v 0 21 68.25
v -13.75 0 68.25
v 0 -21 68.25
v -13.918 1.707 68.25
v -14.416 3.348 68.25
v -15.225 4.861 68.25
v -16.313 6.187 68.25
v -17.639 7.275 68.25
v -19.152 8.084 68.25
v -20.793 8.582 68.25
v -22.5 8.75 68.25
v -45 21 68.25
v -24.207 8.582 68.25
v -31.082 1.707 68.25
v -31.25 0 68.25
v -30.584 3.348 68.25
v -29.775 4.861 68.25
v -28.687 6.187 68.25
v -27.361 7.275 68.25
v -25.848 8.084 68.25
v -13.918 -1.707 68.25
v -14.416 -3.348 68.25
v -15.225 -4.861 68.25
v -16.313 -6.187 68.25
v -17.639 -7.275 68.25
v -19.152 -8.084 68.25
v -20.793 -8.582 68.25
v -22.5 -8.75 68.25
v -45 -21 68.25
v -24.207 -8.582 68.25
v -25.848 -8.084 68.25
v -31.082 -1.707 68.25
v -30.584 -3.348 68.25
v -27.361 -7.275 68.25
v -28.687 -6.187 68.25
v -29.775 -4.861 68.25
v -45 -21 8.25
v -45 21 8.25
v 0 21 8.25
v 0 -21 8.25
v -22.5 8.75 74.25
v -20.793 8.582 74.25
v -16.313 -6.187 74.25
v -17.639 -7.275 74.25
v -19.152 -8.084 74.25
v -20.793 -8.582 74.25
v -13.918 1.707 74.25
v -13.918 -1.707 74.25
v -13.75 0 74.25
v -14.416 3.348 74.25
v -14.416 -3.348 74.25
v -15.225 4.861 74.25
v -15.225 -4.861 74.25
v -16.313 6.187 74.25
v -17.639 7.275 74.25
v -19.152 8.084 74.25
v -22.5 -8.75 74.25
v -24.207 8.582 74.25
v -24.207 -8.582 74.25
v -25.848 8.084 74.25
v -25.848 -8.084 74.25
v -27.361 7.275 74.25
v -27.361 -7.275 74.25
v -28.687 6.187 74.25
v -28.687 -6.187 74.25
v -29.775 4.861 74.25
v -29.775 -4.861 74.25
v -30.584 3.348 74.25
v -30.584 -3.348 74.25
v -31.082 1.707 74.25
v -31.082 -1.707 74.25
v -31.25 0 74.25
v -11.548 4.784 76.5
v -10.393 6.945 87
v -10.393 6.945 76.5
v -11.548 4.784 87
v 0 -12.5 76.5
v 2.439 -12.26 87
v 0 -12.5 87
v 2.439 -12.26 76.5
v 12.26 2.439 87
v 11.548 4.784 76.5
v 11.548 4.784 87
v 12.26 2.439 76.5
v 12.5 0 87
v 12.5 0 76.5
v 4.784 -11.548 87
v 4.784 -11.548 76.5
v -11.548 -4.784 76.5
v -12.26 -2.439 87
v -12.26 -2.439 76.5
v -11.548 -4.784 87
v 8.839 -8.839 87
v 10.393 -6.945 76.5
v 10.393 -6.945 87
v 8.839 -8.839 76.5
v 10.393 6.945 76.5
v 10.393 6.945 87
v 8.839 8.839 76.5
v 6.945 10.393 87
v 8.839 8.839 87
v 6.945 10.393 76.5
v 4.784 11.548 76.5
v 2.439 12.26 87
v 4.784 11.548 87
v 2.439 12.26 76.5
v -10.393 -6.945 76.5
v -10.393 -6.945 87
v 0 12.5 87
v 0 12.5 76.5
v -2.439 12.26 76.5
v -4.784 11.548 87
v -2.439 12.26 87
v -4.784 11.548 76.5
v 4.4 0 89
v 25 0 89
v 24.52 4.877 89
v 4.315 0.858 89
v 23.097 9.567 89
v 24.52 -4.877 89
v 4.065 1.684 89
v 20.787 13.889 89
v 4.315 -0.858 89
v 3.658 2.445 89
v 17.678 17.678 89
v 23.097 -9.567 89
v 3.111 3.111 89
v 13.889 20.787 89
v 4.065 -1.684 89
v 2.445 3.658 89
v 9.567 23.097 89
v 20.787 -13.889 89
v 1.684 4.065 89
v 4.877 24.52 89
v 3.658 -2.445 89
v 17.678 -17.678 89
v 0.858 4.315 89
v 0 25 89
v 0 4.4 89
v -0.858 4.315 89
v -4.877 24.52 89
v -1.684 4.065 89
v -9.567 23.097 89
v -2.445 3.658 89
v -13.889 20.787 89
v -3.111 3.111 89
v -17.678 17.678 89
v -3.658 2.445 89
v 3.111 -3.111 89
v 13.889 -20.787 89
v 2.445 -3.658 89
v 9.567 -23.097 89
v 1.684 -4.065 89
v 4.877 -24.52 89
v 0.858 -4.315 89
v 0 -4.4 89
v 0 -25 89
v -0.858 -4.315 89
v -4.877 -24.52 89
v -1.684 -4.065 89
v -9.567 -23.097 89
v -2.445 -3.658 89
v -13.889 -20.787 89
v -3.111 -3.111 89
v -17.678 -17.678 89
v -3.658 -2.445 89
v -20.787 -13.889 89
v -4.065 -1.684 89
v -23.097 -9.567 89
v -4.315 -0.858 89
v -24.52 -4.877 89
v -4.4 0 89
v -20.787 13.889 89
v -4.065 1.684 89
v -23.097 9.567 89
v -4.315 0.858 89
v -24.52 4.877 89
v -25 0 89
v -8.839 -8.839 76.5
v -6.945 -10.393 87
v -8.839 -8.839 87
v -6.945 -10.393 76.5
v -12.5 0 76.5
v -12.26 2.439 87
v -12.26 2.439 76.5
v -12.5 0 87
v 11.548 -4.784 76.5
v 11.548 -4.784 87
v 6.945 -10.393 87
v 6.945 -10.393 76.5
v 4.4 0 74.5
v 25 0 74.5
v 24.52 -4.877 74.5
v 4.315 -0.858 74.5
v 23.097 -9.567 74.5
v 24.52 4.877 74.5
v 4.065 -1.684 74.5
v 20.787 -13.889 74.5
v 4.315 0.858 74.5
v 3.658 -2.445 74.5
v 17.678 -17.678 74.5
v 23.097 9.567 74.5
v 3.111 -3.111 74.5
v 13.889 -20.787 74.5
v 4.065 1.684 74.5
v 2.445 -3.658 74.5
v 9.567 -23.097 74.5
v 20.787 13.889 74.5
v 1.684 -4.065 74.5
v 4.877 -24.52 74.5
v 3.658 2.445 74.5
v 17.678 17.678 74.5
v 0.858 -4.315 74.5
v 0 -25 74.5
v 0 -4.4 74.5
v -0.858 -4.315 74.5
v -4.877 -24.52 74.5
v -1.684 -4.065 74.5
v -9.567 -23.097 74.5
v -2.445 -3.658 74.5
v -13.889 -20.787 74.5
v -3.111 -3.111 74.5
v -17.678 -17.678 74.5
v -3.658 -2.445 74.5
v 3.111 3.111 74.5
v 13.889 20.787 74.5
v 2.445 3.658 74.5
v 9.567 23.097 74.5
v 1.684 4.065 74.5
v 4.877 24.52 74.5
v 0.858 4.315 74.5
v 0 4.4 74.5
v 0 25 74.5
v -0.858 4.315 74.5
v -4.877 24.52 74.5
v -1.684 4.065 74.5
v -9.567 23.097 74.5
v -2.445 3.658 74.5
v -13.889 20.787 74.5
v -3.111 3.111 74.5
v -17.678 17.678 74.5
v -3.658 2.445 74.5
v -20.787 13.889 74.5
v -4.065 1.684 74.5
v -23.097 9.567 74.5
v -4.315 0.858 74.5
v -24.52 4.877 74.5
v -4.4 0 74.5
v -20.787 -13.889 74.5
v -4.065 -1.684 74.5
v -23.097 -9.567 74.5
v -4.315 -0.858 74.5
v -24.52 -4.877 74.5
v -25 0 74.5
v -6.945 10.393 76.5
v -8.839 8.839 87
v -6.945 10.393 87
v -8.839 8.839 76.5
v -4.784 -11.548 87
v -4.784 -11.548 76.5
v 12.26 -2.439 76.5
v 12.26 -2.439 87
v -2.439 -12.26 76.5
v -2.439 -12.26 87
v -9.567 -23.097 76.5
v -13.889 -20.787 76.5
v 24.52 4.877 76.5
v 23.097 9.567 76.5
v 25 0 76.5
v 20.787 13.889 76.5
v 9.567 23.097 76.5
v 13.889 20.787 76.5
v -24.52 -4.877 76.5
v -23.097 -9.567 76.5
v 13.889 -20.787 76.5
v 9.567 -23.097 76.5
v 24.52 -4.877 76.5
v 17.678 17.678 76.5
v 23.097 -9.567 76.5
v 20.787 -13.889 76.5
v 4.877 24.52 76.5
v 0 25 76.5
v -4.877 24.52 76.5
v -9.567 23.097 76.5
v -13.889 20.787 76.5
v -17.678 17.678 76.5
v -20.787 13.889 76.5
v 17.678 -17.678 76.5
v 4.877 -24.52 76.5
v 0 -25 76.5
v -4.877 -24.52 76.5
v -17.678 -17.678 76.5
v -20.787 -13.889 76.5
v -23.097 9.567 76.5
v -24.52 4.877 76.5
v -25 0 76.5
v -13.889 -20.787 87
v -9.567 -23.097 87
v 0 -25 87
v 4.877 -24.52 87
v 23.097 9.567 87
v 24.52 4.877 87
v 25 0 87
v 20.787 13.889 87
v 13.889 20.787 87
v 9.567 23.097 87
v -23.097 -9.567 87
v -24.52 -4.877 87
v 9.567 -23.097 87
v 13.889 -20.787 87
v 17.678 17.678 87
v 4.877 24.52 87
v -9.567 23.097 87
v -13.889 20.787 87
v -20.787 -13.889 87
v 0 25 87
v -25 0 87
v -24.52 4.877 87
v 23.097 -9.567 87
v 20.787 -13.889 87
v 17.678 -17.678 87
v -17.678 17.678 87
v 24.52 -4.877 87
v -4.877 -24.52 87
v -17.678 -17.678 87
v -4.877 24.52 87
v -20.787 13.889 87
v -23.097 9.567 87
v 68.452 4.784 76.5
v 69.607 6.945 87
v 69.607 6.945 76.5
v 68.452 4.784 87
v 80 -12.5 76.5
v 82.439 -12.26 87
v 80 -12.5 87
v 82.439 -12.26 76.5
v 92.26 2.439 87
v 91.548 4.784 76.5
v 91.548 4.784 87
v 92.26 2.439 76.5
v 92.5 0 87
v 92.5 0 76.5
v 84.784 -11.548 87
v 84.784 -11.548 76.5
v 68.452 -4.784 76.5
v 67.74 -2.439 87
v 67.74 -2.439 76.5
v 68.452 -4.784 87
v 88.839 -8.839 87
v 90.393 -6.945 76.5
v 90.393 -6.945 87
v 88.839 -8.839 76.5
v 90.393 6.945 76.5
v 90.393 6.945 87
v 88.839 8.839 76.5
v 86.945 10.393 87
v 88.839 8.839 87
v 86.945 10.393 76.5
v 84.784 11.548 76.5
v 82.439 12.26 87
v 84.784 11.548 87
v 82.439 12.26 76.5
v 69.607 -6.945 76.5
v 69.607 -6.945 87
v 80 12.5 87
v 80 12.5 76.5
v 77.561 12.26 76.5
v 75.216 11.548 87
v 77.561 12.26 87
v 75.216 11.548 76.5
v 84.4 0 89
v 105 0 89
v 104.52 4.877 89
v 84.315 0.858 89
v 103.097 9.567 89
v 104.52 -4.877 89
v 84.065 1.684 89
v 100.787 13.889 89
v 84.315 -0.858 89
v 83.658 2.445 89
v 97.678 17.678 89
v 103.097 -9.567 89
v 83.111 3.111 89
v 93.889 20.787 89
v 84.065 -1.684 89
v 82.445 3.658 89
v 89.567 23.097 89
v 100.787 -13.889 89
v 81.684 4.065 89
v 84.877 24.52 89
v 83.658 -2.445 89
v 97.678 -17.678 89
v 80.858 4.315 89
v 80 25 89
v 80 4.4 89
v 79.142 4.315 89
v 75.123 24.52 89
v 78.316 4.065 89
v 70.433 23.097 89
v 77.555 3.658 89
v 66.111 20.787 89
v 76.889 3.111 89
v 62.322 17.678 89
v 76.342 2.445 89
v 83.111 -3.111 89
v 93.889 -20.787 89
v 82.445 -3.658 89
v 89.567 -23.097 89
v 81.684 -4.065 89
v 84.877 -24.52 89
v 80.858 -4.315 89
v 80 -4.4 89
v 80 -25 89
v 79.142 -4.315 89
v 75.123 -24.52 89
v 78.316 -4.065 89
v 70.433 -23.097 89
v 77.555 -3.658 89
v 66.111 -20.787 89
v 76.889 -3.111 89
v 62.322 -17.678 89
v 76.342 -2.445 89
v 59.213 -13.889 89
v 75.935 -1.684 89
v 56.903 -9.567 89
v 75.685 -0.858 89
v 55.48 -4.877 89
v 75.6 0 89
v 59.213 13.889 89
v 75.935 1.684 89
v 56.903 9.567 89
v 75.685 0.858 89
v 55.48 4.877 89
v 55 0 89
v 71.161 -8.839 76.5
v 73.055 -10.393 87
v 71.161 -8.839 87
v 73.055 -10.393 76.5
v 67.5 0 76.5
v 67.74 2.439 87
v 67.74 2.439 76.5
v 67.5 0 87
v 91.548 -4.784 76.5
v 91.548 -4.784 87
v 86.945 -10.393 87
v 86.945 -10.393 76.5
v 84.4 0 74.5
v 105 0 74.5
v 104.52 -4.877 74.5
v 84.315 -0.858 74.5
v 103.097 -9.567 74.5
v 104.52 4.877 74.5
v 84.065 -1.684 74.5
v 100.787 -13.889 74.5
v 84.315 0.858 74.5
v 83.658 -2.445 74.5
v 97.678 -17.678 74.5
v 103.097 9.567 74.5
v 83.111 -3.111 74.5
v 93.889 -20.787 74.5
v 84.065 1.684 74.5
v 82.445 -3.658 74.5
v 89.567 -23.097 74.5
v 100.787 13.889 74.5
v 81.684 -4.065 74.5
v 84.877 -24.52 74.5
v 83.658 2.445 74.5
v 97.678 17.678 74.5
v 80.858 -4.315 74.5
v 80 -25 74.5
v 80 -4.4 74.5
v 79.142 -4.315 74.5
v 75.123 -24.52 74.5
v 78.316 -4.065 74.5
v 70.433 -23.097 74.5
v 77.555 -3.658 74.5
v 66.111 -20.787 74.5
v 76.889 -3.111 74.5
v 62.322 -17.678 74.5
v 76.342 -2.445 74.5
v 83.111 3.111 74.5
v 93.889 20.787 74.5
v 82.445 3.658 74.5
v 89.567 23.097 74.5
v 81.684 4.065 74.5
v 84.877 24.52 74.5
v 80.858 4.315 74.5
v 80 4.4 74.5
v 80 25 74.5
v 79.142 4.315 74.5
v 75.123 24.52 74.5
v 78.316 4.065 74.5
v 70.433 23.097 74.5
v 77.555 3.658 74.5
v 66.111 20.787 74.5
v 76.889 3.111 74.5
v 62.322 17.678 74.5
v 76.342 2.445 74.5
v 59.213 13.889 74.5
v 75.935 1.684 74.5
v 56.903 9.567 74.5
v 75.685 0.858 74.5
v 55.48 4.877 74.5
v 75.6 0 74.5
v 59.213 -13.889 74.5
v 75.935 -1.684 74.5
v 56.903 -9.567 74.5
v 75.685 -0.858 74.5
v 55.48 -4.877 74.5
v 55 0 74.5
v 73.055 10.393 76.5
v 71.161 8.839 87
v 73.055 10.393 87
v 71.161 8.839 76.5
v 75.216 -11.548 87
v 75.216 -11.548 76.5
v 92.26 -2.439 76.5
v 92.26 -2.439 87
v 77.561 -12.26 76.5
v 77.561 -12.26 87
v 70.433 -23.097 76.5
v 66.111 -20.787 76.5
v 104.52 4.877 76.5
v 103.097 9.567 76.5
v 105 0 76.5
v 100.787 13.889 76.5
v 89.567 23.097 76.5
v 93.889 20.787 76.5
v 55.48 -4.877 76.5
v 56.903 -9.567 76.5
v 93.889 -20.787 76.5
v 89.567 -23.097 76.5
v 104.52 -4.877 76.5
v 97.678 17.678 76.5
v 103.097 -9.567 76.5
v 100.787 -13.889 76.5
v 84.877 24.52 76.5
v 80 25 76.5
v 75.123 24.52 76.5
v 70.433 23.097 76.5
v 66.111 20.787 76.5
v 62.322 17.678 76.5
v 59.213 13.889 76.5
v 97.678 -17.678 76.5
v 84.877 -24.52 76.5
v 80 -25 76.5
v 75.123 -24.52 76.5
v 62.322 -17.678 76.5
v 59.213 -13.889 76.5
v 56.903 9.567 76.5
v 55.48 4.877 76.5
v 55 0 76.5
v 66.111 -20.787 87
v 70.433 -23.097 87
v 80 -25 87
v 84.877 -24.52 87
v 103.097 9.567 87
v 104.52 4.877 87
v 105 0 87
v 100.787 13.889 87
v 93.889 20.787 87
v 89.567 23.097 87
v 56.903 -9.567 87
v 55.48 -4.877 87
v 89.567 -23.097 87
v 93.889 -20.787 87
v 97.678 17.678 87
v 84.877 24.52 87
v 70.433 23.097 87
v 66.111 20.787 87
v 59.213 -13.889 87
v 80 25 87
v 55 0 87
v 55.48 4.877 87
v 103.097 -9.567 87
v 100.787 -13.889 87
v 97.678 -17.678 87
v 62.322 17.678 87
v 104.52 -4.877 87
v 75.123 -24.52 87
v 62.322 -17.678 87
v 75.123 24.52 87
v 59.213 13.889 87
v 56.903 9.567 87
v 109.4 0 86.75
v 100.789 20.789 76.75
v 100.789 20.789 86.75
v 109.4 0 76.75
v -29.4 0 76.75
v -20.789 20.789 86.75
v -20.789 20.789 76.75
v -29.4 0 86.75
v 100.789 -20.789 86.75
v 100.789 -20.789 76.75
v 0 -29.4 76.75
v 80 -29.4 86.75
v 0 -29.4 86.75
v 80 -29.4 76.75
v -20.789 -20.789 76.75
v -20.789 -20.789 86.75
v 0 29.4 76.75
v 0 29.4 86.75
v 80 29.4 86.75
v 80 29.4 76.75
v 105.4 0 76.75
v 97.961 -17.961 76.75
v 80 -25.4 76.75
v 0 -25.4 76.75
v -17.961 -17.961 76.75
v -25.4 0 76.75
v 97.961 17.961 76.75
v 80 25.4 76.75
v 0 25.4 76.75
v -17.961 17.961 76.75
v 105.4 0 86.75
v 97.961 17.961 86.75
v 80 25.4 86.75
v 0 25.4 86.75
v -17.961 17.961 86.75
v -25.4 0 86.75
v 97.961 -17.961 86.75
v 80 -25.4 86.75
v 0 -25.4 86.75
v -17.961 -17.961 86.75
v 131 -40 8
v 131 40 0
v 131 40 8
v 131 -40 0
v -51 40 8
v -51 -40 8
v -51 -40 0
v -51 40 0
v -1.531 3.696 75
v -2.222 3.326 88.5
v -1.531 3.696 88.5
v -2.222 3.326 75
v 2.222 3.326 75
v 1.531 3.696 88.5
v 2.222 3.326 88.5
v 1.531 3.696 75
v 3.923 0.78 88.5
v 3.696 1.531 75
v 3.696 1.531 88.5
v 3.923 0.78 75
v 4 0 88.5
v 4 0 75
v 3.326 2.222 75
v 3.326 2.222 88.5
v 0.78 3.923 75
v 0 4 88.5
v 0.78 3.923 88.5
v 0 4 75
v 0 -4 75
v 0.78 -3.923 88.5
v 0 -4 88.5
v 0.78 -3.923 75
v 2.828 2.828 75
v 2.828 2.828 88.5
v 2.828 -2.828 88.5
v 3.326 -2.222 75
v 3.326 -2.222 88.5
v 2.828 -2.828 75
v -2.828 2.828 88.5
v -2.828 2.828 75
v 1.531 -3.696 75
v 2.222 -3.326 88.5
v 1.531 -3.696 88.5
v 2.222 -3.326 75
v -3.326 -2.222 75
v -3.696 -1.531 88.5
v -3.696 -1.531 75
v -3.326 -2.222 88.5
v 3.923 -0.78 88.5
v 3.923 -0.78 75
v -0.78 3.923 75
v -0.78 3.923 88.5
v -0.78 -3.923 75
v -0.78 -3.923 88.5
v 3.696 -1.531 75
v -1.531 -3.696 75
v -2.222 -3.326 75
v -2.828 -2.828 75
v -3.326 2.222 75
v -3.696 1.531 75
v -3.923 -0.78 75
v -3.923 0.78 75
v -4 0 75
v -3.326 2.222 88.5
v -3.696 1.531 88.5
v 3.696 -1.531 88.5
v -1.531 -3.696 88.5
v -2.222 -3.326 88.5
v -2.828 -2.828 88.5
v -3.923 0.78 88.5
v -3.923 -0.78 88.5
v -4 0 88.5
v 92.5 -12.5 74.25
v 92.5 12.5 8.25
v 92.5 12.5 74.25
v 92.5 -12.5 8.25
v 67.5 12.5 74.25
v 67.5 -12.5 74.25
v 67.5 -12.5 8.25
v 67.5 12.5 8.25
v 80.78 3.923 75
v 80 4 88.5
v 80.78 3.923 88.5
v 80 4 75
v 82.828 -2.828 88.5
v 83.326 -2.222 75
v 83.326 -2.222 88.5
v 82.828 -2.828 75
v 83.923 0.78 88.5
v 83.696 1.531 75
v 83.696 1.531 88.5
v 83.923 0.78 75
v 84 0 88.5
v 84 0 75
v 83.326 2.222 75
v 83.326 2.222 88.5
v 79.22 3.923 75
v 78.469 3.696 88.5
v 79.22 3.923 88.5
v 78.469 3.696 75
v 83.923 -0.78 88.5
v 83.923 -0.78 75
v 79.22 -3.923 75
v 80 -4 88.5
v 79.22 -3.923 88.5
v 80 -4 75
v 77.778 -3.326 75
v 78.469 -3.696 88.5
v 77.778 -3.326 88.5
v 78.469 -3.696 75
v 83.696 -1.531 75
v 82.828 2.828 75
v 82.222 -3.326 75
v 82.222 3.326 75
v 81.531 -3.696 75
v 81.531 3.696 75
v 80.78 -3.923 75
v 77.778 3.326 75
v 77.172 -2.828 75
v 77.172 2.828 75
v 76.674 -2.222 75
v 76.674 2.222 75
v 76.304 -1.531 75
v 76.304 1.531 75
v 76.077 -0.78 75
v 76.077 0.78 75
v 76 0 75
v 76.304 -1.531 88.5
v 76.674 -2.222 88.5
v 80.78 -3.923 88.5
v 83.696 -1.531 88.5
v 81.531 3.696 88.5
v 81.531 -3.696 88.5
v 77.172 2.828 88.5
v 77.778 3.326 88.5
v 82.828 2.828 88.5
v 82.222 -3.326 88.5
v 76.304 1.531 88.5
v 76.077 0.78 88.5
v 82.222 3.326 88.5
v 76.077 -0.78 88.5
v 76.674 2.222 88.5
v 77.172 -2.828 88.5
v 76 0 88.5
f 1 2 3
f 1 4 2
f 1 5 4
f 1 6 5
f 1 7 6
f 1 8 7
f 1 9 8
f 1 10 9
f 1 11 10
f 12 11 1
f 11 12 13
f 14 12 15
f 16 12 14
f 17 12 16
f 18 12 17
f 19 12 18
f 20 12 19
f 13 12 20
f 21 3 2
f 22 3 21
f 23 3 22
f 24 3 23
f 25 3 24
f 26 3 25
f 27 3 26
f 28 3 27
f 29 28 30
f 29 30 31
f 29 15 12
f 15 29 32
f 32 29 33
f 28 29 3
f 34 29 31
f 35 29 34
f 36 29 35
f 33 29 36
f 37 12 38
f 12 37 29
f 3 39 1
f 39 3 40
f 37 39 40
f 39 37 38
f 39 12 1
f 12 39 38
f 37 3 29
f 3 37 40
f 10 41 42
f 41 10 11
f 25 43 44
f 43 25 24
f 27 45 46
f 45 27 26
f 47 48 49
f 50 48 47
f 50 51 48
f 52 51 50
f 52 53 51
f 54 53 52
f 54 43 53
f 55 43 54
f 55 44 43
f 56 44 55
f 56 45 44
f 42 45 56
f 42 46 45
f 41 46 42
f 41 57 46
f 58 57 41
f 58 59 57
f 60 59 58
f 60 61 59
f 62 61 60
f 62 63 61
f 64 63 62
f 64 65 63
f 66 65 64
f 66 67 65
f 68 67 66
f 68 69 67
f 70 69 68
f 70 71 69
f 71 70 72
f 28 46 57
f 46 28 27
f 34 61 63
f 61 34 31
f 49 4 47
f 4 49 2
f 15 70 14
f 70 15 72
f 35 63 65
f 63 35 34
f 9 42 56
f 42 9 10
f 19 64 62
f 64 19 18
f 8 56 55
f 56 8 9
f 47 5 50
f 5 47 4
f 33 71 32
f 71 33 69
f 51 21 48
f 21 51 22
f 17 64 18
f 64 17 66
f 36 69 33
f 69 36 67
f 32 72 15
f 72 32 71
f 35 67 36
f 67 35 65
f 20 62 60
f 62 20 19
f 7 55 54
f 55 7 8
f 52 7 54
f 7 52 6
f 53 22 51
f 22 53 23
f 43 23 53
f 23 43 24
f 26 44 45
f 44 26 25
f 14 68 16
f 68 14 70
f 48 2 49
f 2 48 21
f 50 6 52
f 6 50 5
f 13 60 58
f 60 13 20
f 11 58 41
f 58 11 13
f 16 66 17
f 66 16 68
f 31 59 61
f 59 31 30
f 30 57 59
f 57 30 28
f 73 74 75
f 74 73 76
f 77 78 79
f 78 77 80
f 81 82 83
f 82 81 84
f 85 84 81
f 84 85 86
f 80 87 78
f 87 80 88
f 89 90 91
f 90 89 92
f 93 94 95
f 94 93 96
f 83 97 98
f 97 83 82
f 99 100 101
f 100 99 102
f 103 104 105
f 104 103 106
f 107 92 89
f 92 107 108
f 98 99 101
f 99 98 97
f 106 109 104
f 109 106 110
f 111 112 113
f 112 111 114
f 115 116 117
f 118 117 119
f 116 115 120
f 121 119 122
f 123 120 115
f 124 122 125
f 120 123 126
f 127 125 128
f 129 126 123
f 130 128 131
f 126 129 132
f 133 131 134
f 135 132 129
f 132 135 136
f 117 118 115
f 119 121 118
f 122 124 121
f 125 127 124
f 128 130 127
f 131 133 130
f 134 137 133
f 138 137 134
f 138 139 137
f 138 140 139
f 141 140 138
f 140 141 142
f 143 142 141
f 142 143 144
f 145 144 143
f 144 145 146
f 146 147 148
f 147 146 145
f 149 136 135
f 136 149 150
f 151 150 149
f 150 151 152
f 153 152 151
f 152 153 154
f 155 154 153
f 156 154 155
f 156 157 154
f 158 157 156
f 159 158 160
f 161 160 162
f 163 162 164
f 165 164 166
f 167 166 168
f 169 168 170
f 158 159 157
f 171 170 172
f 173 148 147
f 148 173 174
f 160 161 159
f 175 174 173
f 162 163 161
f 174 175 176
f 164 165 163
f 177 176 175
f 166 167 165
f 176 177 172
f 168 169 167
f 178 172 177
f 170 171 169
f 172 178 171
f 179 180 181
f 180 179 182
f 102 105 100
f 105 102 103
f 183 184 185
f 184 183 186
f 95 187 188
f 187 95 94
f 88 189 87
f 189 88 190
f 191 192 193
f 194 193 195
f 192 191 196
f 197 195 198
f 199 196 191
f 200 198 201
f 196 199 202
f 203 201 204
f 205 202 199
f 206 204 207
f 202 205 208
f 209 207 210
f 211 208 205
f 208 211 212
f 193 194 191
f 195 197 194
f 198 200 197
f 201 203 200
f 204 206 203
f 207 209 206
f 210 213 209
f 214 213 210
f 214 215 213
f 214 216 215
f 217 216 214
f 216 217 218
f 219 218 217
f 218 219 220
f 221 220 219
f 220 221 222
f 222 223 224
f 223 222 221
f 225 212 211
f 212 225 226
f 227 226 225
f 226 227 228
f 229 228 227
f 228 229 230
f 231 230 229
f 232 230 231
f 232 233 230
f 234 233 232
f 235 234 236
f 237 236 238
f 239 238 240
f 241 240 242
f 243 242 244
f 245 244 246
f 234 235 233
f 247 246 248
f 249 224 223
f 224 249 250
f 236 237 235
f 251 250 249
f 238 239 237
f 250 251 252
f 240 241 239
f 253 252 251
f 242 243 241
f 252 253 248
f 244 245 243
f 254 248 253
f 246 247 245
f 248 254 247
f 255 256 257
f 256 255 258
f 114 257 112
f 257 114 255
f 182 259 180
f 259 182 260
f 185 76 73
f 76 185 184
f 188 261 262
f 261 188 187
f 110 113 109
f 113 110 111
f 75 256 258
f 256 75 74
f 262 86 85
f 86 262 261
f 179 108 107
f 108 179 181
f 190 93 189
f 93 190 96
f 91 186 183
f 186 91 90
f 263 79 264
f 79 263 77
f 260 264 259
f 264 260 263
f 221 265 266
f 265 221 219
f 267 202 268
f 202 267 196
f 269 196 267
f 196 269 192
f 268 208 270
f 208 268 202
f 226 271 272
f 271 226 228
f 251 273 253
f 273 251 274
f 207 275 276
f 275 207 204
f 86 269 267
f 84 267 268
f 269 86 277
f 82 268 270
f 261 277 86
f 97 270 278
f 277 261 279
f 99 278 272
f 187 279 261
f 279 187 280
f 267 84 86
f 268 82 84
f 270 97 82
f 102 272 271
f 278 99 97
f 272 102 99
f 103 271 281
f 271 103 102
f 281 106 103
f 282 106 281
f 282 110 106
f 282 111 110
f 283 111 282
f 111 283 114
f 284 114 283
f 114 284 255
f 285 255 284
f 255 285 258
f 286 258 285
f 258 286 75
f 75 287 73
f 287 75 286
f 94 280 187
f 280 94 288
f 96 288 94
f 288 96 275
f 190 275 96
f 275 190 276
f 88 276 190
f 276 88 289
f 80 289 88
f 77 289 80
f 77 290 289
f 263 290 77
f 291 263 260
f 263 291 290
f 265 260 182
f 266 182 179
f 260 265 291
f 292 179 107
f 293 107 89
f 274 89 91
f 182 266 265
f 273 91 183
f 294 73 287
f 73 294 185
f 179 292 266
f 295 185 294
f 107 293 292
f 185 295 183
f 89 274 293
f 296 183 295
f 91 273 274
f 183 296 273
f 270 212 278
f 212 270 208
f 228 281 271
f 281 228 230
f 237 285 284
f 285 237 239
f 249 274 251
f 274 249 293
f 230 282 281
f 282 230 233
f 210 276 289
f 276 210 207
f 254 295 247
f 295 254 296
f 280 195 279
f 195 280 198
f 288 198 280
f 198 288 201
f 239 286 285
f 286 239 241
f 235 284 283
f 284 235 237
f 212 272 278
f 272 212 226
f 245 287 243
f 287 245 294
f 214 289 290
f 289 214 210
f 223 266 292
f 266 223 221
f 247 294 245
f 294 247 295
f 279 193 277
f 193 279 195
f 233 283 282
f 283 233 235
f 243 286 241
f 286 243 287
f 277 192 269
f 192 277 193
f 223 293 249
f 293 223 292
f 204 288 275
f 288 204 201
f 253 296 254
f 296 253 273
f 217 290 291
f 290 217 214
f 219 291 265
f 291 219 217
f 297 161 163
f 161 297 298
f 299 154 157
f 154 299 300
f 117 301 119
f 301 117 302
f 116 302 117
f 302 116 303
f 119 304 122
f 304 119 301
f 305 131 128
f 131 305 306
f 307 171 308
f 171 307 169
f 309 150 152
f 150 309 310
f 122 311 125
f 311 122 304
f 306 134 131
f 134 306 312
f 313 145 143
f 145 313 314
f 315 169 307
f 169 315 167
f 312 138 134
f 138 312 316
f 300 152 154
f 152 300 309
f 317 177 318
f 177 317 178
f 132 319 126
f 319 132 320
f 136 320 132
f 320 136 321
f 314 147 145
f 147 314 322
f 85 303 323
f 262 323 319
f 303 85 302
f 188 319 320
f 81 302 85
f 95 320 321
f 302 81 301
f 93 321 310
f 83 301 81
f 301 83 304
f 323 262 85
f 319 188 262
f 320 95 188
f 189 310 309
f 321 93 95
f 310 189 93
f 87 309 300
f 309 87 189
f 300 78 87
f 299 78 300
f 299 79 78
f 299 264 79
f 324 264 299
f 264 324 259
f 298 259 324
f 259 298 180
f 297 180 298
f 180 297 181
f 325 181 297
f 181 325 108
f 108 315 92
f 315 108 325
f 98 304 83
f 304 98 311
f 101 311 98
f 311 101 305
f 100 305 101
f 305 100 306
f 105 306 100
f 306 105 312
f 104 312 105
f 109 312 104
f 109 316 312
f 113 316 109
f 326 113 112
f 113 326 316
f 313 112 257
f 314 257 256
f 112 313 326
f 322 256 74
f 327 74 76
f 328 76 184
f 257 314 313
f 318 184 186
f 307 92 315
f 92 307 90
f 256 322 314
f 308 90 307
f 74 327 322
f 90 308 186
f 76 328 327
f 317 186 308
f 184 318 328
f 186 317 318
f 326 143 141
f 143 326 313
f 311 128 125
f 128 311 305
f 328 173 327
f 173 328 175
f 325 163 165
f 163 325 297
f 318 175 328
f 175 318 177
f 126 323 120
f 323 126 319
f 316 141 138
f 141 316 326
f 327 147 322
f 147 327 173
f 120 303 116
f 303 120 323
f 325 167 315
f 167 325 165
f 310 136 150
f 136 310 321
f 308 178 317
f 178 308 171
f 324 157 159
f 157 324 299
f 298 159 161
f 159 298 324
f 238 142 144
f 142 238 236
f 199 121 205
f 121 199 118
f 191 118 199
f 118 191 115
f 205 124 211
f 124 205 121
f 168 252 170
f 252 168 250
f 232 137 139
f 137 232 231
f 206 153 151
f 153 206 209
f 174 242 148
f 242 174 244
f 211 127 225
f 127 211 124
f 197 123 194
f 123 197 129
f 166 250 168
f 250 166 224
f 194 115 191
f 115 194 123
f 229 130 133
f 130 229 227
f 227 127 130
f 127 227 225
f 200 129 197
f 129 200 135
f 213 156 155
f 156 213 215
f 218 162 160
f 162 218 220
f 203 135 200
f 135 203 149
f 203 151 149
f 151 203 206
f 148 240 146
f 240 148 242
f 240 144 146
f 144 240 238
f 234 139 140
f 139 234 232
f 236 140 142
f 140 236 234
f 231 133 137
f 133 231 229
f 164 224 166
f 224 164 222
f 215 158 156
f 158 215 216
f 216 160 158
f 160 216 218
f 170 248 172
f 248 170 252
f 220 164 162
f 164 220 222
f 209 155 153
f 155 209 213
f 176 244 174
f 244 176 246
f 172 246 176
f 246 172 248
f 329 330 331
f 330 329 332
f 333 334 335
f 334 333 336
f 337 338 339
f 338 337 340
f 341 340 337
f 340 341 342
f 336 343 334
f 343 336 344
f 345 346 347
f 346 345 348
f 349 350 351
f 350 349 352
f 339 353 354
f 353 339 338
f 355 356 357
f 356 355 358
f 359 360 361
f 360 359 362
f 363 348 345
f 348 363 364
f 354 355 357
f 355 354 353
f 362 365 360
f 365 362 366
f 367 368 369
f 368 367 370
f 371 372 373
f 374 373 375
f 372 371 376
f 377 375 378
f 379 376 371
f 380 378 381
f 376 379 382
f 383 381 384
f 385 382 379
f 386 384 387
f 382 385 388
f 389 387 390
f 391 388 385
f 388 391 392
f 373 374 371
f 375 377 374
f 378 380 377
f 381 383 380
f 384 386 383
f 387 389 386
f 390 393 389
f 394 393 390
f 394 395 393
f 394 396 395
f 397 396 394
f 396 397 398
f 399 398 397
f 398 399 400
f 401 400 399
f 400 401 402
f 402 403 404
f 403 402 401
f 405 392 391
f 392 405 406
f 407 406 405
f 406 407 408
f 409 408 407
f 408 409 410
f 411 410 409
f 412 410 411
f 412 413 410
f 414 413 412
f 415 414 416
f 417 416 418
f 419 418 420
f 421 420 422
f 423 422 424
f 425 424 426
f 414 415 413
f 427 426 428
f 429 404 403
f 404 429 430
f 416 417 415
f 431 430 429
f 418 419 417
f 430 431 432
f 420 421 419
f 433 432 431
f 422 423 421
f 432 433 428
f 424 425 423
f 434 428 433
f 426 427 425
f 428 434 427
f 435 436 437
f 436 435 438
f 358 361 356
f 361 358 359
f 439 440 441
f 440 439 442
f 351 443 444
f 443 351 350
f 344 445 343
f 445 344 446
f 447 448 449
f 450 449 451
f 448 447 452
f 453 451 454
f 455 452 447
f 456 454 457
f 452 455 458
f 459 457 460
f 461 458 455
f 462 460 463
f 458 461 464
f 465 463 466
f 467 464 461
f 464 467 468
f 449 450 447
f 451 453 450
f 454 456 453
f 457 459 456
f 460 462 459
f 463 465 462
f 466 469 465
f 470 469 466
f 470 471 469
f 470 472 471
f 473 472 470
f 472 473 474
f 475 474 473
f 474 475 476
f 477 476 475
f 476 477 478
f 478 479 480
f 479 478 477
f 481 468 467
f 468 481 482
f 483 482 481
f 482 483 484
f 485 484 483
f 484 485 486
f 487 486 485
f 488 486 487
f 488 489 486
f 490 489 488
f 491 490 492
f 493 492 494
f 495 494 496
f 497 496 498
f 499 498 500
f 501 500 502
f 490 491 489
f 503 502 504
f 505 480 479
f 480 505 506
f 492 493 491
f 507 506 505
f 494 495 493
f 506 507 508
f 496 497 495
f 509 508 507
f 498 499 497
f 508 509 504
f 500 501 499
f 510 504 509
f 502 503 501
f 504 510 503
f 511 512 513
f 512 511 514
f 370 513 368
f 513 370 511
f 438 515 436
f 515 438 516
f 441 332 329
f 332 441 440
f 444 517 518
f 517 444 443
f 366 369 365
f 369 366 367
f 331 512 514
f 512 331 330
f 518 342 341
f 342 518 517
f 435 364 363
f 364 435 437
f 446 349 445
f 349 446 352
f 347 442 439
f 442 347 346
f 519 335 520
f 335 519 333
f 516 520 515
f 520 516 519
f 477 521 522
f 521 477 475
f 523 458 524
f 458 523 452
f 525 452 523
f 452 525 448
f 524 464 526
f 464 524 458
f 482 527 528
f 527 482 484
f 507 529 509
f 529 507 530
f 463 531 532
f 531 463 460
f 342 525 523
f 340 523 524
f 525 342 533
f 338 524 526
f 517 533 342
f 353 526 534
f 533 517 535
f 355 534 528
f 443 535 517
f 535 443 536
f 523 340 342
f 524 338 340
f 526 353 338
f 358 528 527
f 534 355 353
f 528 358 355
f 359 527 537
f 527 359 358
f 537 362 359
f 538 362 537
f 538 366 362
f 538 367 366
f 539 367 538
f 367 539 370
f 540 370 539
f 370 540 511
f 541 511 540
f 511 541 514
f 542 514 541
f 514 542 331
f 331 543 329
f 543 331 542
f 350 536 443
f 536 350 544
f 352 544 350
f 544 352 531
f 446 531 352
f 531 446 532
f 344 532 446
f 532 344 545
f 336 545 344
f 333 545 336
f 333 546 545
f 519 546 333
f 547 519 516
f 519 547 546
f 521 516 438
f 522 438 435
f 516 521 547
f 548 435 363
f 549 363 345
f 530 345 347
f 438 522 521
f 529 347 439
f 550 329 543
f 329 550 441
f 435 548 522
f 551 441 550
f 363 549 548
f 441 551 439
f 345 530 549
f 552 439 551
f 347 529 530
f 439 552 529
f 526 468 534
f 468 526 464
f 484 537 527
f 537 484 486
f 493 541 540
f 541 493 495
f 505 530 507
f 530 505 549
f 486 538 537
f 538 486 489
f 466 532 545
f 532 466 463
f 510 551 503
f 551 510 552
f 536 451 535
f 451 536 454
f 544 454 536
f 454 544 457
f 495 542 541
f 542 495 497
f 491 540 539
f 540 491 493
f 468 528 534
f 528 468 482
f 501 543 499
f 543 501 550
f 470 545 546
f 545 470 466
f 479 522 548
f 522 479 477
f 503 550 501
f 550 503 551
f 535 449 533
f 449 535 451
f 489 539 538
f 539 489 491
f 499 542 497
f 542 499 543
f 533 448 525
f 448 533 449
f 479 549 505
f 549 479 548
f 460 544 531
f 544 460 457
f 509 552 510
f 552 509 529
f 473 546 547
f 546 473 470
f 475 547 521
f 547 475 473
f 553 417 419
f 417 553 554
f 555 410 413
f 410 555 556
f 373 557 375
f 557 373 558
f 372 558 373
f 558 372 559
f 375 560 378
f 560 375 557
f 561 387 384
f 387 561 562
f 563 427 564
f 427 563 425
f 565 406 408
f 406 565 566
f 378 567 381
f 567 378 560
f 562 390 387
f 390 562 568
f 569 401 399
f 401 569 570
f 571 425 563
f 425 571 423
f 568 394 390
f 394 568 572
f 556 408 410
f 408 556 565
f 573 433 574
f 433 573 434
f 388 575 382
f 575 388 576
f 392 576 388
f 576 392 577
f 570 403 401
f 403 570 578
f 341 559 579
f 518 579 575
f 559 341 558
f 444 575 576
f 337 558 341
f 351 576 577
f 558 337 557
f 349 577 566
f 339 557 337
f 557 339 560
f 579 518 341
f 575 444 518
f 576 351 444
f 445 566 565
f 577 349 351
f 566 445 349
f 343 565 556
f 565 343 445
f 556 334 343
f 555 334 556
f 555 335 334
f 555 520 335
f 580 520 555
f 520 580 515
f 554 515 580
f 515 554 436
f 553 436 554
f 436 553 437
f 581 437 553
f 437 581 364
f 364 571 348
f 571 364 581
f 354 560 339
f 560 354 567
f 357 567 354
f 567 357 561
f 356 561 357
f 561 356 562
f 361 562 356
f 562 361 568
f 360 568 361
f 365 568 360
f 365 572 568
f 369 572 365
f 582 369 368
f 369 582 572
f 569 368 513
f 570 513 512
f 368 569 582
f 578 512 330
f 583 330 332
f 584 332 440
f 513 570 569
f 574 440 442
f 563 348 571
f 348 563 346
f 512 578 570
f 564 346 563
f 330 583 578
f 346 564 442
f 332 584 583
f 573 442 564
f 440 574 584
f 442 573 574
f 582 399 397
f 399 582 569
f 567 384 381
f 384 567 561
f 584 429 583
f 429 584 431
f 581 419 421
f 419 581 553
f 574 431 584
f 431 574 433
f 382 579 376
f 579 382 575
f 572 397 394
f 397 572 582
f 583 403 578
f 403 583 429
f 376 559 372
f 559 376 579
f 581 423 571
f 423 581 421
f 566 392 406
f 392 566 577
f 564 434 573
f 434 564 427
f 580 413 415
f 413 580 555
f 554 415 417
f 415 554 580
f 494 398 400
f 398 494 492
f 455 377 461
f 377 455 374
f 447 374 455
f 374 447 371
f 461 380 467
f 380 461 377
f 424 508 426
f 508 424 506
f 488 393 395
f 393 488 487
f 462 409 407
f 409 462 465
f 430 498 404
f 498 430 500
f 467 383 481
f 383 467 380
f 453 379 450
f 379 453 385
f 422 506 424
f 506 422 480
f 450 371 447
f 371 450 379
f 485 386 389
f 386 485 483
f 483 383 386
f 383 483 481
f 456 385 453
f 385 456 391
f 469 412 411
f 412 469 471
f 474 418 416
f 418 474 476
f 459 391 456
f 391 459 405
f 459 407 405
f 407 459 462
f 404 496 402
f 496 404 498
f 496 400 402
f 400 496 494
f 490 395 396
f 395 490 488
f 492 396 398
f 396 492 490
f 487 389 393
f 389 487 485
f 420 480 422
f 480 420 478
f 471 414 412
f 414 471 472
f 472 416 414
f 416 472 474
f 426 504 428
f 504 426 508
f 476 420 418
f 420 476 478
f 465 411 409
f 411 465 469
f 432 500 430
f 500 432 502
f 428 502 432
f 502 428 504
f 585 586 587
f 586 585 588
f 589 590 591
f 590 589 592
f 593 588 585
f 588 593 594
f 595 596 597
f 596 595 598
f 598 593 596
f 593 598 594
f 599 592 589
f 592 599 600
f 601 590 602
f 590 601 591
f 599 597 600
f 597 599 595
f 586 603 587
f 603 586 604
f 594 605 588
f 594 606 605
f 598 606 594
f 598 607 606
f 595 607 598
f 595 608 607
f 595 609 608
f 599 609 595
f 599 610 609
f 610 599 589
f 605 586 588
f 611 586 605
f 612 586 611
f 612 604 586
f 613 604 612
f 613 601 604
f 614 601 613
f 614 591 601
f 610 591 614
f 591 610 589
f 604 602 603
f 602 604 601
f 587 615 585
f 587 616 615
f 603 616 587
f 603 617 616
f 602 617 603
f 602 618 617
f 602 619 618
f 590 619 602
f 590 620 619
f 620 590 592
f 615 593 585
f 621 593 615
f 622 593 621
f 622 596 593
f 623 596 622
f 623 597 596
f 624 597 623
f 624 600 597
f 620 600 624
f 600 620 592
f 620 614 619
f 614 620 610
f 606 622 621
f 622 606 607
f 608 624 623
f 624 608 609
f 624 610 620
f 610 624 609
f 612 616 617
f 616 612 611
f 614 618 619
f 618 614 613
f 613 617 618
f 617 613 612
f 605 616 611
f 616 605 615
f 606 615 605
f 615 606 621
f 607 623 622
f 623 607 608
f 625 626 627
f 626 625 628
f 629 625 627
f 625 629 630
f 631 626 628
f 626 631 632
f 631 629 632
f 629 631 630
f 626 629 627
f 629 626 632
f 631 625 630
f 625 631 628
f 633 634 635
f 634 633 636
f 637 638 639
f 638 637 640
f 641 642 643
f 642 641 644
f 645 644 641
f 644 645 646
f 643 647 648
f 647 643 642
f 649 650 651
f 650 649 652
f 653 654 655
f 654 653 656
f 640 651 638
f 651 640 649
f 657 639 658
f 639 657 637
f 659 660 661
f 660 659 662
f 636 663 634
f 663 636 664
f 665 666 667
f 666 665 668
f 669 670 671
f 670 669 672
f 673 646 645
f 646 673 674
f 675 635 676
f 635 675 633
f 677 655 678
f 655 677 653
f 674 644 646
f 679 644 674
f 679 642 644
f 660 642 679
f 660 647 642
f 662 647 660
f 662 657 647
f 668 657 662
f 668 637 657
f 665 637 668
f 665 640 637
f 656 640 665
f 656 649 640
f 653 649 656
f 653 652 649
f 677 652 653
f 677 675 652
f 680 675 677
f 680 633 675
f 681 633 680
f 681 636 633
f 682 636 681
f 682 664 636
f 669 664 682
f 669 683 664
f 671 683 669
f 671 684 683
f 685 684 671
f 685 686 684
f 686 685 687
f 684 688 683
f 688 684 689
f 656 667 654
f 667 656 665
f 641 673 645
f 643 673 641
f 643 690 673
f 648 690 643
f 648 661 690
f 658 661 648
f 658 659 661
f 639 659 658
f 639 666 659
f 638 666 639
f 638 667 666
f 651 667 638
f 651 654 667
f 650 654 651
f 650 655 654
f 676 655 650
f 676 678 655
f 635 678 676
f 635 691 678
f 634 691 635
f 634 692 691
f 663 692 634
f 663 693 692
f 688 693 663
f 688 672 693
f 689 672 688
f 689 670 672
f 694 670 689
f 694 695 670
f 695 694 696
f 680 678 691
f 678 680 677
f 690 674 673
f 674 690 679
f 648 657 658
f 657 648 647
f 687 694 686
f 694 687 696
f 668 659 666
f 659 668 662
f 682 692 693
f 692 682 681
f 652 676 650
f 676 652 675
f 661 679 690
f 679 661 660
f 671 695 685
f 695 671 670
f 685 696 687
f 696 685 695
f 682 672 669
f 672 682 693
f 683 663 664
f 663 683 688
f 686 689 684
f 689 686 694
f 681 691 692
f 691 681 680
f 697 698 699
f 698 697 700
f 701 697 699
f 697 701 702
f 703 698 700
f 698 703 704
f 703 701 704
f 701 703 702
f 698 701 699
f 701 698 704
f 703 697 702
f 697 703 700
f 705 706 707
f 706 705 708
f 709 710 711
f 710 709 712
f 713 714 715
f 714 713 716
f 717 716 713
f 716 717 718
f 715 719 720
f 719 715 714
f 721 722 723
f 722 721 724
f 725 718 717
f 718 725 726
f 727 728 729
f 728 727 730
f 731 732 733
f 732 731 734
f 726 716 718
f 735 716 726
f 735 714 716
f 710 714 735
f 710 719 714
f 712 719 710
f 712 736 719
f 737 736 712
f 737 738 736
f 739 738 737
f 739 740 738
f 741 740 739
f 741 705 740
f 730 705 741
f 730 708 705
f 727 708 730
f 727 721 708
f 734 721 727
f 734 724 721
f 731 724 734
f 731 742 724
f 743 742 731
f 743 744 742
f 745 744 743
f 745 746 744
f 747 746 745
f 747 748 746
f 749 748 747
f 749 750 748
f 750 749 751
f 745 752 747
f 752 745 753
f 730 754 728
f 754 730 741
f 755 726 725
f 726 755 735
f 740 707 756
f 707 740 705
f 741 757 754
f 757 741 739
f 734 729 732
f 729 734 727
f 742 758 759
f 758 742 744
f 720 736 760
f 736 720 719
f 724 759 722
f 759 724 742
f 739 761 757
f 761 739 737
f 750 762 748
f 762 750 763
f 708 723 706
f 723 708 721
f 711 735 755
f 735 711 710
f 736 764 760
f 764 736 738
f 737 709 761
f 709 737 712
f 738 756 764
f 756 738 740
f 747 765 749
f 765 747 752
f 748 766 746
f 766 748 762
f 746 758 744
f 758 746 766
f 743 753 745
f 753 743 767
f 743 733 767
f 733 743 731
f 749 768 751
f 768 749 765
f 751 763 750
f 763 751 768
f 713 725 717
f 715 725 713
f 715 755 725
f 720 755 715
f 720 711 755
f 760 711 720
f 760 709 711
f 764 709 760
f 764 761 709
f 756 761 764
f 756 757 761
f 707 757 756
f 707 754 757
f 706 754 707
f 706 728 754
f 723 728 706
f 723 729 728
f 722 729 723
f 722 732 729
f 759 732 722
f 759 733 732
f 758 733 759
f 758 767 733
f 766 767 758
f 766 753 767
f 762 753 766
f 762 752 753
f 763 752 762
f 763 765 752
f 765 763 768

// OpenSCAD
$fn = 32;

// ------------------------------------------------------------------------
// Motor belt drive: span 80 mm, pulleys d50, belt 10 mm wide
// Every part is its own module, assembly() places every instance.
// ------------------------------------------------------------------------

// --- part 1 ---
module base_plate() {
  difference() {
    translate([-91, -40, 0]) cube([182, 80, 8]);
  }
}

// --- part 2 ---
module motor() {
  union() {
    translate([-30, -21, 0]) cube([60, 42, 45]);
    translate([33, 0, 22.5]) rotate([0, 90, 0]) cylinder(h = 6, d = 17.5, center = true);
  }
}

// --- part 3 ---
module drive_shaft() {
  translate([0, 0, -6.75]) cylinder(h = 13.5, d = 8);
}

// --- part 4 ---
module pulley_drive() {
  difference() {
    union() {
      cylinder(h = 14.5, d = 25);
      cylinder(h = 2, d = 50);
      translate([0, 0, 12.5]) cylinder(h = 2, d = 50);
    }
    translate([0, 0, -1]) cylinder(h = 16.5, d = 8.8);
  }
}

// --- part 5 ---
module idler_post() {
  translate([-12.5, -12.5, 0]) cube([25, 25, 66]);
}

// --- part 6 ---
module driven_shaft() {
  translate([0, 0, -6.75]) cylinder(h = 13.5, d = 8);
}

// --- part 7 ---
module pulley_driven() {
  difference() {
    union() {
      cylinder(h = 14.5, d = 25);
      cylinder(h = 2, d = 50);
      translate([0, 0, 12.5]) cylinder(h = 2, d = 50);
    }
    translate([0, 0, -1]) cylinder(h = 16.5, d = 8.8);
  }
}

// --- part 8 ---
module drive_belt() {
  difference() {
    linear_extrude(height = 10) polygon(points = concat([for (a = [90 : 45 : 270]) [29.4 * cos(a), 29.4 * sin(a)]], [for (a = [270 : 45 : 450]) [80 + 29.4 * cos(a), 29.4 * sin(a)]]));
    translate([0, 0, -1]) linear_extrude(height = 12) polygon(points = concat([for (a = [90 : 45 : 270]) [25.4 * cos(a), 25.4 * sin(a)]], [for (a = [270 : 45 : 450]) [80 + 25.4 * cos(a), 25.4 * sin(a)]]));
  }
}

// --- assembly ---
module assembly() {
  color([0.80, 0.24, 0.20]) translate([40, 0, 0]) rotate([0, 0, 0]) base_plate();
  color([0.20, 0.45, 0.75]) translate([0, 0, 38.25]) rotate([0, 270, 0]) motor();
  color([0.25, 0.62, 0.32]) translate([0, 0, 81.75]) rotate([0, 0, 0]) drive_shaft();
  color([0.92, 0.70, 0.18]) translate([0, 0, 74.5]) rotate([0, 0, 0]) pulley_drive();
  color([0.58, 0.35, 0.70]) translate([80, 0, 8.25]) rotate([0, 0, 0]) idler_post();
  color([0.16, 0.66, 0.66]) translate([80, 0, 81.75]) rotate([0, 0, 0]) driven_shaft();
  color([0.85, 0.48, 0.18]) translate([80, 0, 74.5]) rotate([0, 0, 0]) pulley_driven();
  color([0.55, 0.60, 0.65]) translate([0, 0, 76.75]) rotate([0, 0, 0]) drive_belt();
}

assembly();
